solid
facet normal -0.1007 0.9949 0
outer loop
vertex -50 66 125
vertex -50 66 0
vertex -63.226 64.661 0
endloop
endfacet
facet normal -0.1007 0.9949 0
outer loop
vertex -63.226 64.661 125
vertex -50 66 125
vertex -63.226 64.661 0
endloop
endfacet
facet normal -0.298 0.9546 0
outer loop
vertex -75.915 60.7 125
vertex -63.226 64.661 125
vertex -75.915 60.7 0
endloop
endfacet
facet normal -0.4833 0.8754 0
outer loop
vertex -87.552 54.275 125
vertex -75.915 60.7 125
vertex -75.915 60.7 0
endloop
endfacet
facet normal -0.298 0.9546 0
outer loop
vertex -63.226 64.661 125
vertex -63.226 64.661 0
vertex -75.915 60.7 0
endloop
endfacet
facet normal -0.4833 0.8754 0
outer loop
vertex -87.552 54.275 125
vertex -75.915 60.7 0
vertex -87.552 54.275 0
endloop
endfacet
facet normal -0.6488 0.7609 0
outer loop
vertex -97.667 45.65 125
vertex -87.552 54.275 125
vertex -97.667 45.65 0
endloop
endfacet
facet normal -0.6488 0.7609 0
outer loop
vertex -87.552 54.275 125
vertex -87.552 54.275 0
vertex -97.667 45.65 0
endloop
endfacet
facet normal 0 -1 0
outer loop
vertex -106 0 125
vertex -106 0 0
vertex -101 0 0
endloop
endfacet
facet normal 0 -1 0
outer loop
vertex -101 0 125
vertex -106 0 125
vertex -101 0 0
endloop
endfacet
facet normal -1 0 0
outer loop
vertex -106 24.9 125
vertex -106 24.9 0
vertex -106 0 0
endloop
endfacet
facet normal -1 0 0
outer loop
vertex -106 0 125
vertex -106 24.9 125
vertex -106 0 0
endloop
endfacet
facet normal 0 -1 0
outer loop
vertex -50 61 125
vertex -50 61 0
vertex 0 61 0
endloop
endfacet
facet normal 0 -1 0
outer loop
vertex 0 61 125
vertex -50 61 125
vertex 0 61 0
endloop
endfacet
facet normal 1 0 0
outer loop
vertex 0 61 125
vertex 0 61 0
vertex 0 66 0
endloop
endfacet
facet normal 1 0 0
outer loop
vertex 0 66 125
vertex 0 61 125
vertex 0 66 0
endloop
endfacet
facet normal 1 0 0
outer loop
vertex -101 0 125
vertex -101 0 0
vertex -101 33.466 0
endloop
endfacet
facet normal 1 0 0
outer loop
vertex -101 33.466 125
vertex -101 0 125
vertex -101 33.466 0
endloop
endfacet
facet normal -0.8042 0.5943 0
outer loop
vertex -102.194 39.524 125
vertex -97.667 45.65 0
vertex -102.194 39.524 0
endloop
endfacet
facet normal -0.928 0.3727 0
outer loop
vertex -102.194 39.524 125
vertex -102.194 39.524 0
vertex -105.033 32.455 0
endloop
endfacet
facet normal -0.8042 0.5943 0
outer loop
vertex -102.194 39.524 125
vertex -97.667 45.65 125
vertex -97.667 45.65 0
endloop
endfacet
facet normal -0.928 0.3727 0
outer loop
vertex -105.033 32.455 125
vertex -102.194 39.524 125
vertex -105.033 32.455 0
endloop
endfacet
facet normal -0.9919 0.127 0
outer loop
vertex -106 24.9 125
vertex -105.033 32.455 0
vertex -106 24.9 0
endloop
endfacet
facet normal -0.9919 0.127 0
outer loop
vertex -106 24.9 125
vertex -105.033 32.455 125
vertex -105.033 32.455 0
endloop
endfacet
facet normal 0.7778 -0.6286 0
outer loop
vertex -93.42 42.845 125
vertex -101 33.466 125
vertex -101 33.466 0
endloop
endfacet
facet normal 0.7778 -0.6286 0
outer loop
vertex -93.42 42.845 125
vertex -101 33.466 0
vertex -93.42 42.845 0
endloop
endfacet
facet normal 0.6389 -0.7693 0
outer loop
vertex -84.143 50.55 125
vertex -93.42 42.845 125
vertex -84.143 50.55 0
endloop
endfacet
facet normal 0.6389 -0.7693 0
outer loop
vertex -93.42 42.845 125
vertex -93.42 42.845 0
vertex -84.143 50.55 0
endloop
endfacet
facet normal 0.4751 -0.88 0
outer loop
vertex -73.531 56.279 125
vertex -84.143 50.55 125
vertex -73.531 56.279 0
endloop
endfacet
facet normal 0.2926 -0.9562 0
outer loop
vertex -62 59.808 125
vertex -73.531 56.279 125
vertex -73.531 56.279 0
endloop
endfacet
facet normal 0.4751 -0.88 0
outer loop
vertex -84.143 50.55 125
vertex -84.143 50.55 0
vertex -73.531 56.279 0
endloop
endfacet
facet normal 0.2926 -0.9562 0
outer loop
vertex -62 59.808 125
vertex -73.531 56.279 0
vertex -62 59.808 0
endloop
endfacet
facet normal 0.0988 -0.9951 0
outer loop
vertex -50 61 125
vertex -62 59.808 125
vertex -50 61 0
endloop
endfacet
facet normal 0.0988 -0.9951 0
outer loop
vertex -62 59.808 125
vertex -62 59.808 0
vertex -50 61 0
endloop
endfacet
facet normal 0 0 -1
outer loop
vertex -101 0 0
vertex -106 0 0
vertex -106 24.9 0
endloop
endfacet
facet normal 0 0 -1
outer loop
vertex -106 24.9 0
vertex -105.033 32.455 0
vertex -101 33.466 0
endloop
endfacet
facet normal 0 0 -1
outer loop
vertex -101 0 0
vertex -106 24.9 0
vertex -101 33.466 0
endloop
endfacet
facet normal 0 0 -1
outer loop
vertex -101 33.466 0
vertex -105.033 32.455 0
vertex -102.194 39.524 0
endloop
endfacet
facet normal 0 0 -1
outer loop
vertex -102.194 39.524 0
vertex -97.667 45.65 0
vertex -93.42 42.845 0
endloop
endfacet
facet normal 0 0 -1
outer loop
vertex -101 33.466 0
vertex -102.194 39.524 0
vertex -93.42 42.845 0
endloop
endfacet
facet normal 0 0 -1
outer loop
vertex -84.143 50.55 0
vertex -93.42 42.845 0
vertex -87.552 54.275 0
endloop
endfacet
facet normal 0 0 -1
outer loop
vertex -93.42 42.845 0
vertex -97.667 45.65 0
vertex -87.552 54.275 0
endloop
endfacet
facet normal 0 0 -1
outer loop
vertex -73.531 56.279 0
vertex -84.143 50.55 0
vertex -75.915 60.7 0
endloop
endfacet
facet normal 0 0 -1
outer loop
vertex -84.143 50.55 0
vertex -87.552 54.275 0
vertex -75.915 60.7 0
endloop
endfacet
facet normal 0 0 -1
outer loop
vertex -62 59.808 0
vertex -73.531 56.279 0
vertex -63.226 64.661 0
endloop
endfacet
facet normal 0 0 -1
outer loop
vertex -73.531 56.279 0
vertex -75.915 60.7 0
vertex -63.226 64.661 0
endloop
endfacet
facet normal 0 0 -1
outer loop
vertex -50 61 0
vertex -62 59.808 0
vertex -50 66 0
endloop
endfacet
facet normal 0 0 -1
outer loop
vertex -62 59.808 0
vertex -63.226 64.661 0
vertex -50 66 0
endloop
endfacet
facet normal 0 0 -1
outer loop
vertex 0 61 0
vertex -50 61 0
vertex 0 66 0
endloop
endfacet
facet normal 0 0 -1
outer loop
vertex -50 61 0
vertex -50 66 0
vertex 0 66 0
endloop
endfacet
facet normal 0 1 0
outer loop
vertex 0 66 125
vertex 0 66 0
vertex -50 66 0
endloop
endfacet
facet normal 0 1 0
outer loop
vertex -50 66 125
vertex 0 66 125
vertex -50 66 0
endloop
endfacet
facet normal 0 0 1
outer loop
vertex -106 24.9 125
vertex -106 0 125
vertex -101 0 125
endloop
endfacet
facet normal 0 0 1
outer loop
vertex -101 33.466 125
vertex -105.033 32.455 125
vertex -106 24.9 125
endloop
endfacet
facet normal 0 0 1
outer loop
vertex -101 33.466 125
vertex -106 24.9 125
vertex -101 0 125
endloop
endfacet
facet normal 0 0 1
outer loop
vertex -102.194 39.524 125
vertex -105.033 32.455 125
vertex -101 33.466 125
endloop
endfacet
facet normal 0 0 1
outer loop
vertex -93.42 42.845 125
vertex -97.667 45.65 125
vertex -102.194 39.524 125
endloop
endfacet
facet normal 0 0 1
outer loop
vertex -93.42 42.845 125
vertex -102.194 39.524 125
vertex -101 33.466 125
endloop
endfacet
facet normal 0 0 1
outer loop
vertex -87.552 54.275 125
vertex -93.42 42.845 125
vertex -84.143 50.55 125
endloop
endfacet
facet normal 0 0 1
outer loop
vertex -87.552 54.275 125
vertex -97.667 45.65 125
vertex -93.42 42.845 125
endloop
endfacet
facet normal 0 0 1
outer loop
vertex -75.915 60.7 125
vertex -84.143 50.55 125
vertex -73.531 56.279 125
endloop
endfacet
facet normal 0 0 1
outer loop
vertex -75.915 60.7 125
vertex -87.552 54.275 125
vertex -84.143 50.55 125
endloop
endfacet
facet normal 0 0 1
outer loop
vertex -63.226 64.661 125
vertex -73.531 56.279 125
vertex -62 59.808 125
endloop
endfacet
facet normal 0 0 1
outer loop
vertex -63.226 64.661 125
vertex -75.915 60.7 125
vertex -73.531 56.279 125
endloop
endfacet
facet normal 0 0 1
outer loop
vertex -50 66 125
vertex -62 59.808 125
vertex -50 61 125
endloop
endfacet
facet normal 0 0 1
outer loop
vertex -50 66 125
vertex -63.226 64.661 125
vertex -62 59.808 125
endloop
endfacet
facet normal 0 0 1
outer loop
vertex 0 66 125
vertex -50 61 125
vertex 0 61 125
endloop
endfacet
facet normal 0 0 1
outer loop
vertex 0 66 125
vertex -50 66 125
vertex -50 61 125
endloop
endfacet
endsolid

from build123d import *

# Parameters (mm, degrees)
EXTRUDE_1_DEPTH = 125
FILLET_1_R      = 30


with BuildPart() as part:
    # ｽｹｯﾁ1 → ﾎﾞｽ - 押し出し1 (new body)
    with BuildSketch(Plane.XY):
        with BuildLine():
            Line((-101, 0), (-101, 33.466401061))
            ThreePointArc((-101, 33.466401061), (-78.978867604, 53.677045675), (-50, 61))
            Line((-50, 61), (0, 61))
            Line((0, 61), (0, 66))
            Line((0, 66), (-50, 66))
            ThreePointArc((-50, 66), (-82.02123597, 57.711701127), (-106, 34.928498393))
            Line((-106, 34.928498393), (-106, 0))
            Line((-106, 0), (-101, 0))
        make_face()
    extrude(amount=EXTRUDE_1_DEPTH)

    # ﾌｨﾚｯﾄ1
    fillet_1_edges = [part.edges().sort_by_distance(p)[0] for p in [
        (-106, 34.928498393, 62.5),
    ]]
    fillet(fillet_1_edges, radius=FILLET_1_R)


solid = part.part
